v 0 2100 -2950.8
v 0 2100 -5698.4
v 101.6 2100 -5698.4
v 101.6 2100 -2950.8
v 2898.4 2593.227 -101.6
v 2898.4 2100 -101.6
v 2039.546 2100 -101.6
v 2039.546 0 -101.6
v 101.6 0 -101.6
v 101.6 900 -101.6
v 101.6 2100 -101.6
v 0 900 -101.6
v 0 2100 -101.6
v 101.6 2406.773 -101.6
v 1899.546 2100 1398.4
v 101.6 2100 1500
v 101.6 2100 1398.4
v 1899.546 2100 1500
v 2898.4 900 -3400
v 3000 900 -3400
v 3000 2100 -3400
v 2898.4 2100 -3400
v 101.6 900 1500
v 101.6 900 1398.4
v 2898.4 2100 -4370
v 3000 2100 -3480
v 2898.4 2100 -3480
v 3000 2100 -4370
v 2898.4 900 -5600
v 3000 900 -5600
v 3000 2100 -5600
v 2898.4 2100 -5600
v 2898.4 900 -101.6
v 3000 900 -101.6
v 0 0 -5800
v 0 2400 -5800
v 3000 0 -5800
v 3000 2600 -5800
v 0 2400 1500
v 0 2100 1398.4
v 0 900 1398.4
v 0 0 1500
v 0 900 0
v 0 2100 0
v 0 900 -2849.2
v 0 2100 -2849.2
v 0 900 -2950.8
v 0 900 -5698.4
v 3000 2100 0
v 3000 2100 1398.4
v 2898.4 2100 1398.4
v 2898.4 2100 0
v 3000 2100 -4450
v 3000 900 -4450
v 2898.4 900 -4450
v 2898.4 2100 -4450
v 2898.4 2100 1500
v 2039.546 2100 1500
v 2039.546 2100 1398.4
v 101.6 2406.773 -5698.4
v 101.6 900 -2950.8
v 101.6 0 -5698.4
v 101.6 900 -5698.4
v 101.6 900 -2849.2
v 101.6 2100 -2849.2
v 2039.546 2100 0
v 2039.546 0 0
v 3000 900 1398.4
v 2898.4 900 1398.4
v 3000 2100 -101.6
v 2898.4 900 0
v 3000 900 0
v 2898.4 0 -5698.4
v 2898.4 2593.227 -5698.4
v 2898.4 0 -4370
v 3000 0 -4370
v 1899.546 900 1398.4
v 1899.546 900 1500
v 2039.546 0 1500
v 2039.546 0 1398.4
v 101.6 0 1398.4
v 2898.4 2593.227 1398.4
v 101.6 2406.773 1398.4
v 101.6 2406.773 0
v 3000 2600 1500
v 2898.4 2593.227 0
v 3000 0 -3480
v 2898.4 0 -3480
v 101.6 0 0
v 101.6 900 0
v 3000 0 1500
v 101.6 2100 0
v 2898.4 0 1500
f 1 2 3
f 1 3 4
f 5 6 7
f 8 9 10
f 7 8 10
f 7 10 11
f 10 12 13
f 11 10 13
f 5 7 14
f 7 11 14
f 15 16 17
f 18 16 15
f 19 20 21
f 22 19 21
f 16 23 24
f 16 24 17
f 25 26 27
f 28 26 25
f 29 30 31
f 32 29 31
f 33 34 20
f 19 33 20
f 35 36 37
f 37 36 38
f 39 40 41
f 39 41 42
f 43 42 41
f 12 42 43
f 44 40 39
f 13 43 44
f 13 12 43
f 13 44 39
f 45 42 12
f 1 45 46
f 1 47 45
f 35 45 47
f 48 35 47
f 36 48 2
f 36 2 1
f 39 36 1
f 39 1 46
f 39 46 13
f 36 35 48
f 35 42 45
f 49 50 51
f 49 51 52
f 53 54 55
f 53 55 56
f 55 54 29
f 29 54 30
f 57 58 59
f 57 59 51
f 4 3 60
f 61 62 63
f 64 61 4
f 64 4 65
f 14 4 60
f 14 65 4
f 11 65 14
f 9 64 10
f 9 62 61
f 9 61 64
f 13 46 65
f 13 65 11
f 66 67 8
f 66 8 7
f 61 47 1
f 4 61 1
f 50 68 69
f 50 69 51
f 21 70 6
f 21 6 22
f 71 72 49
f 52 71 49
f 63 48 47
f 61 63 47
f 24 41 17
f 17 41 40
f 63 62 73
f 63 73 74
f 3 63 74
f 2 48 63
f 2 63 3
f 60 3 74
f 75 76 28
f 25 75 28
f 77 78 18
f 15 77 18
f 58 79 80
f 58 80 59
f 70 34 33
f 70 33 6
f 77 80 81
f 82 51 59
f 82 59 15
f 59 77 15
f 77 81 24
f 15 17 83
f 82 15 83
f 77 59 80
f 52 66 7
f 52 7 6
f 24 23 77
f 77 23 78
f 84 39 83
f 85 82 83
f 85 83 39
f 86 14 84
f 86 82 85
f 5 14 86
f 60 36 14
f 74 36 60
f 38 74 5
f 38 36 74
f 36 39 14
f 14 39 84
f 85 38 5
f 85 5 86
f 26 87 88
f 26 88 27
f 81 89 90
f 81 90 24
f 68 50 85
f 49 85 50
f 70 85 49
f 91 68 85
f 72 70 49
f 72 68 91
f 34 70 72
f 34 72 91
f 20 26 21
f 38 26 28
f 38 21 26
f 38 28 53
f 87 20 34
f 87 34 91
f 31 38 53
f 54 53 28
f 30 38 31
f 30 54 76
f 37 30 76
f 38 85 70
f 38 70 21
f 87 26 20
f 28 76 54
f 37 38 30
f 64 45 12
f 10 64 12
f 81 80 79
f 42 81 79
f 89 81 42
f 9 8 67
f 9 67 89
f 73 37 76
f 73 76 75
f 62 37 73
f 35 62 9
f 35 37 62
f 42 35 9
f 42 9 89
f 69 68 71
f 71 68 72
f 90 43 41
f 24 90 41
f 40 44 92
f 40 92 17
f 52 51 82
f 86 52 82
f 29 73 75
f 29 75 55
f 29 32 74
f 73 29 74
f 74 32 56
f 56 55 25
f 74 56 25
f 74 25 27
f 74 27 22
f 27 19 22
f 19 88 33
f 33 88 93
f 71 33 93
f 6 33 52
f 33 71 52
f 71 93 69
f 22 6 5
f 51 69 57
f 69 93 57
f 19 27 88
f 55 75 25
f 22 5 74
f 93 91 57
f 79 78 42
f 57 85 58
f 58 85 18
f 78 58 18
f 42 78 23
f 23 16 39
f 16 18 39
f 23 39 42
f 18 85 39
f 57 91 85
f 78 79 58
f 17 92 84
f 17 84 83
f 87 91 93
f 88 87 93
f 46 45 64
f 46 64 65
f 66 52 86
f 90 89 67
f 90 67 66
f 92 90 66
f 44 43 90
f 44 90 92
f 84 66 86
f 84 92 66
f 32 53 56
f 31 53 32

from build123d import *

# Parameters (mm, degrees)
CROQUIS1_W              = 3000
CROQUIS1_H              = 2600
SALIENTE_EXTRUIR1_DEPTH = 5800
CORTAR_EXTRUIR1_DEPTH   = 5800
CROQUIS4_W              = 2747.6
CROQUIS4_H              = 1200
CORTAR_EXTRUIR2_DEPTH   = 101.6
CROQUIS6_W              = 2796.8
CROQUIS6_H              = 5596.8
CORTAR_EXTRUIR5_DEPTH   = 3000
SALIENTE_EXTRUIR3_DEPTH = 1500
CROQUIS14_W             = 2796.8
CROQUIS14_H             = 1398.4
CORTAR_EXTRUIR7_DEPTH   = 3000
CORTAR_EXTRUIR8_REACH   = 8311.633
CROQUIS15_W             = 858.853595779
CROQUIS15_H             = 2100
CROQUIS16_W             = 1398.4
CROQUIS16_H             = 1200
CORTAR_EXTRUIR9_DEPTH   = 200
CROQUIS17_W             = 1797.946404221
CROQUIS17_H             = 1200
CORTAR_EXTRUIR10_DEPTH  = 200
CROQUIS18_W             = 1398.4
CROQUIS18_H             = 1200
CROQUIS18_W_2           = 3298.4
CORTAR_EXTRUIR11_DEPTH  = 200
CROQUIS19_W             = 1150
CROQUIS19_H             = 1200
CORTAR_EXTRUIR12_DEPTH  = 200
CROQUIS20_W             = 890
CROQUIS20_H             = 2100
CORTAR_EXTRUIR13_DEPTH  = 200


with BuildPart() as part:
    # Croquis1 → Saliente-Extruir1 (new body)
    with BuildSketch(Plane.XY):
        with Locations((1500, 1300)):
            Rectangle(CROQUIS1_W, CROQUIS1_H)
    extrude(amount=-SALIENTE_EXTRUIR1_DEPTH)

    # Croquis3 → Cortar-Extruir1 (cut)
    with BuildSketch(Plane.XY):
        Polygon((0, 2600), (0, 2400), (3000, 2600), align=None)
    extrude(amount=-CORTAR_EXTRUIR1_DEPTH, mode=Mode.SUBTRACT)

    # Croquis4 → Cortar-Extruir2 (cut)
    with BuildSketch(Plane.ZY):
        with Locations((-4324.6, 1500)):
            Rectangle(CROQUIS4_W, CROQUIS4_H)
        with Locations((-1475.4, 1500)):
            Rectangle(CROQUIS4_W, CROQUIS4_H)
    extrude(amount=-CORTAR_EXTRUIR2_DEPTH, mode=Mode.SUBTRACT)

    # Croquis6 → Cortar-Extruir5 (cut)
    with BuildSketch(Plane.XZ):
        with Locations((1500, -2900)):
            Rectangle(CROQUIS6_W, CROQUIS6_H)
    extrude(amount=-CORTAR_EXTRUIR5_DEPTH, mode=Mode.SUBTRACT)

    # Croquis13 → Saliente-Extruir3 (add)
    with BuildSketch(Plane.XY):
        Polygon((0, 0), (0, 2400), (3000, 2600), (3000, 0), align=None)
    extrude(amount=SALIENTE_EXTRUIR3_DEPTH)

    # Croquis14 → Cortar-Extruir7 (cut)
    with BuildSketch(Plane.XZ):
        with Locations((1500, 699.2)):
            Rectangle(CROQUIS14_W, CROQUIS14_H)
    extrude(amount=-CORTAR_EXTRUIR7_DEPTH, mode=Mode.SUBTRACT)

    # Cortar-Extruir8: up to this face of the body (flat: up to its plane)
    cortar_extruir8_end = Plane(part.part.faces().sort_by_distance((1492.247795295, 1254.854041559, -101.6))[0])
    # Croquis15 → Cortar-Extruir8 (cut, up to the picked face)
    with BuildSketch(Plane.XY.offset(1500), mode=Mode.PRIVATE) as cortar_extruir8_sk1:
        with Locations((2468.973202111, 1050)):
            Rectangle(CROQUIS15_W, CROQUIS15_H)
    cortar_extruir8_tool1 = split(extrude(cortar_extruir8_sk1.sketch, amount=-CORTAR_EXTRUIR8_REACH, mode=Mode.PRIVATE), bisect_by=cortar_extruir8_end, keep=Keep.BOTH, mode=Mode.PRIVATE)
    add(cortar_extruir8_tool1.solids().sort_by(Axis((2468.973202, 1050, 1500), (0, 0, -1)))[0], mode=Mode.SUBTRACT)

    # Croquis16 → Cortar-Extruir9 (cut)
    with BuildSketch(Plane.ZY):
        with Locations((699.2, 1500)):
            Rectangle(CROQUIS16_W, CROQUIS16_H)
    extrude(amount=-CORTAR_EXTRUIR9_DEPTH, mode=Mode.SUBTRACT)

    # Croquis17 → Cortar-Extruir10 (cut)
    with BuildSketch(Plane.XY.offset(1500)):
        with Locations((1000.573202111, 1500)):
            Rectangle(CROQUIS17_W, CROQUIS17_H)
    extrude(amount=-CORTAR_EXTRUIR10_DEPTH, mode=Mode.SUBTRACT)

    # Croquis18 → Cortar-Extruir11 (cut)
    with BuildSketch(Plane(origin=(3000, 0, 0), x_dir=(0, 0, -1), z_dir=(1, 0, 0))):
        with Locations((-699.2, 1500)):
            Rectangle(CROQUIS18_W, CROQUIS18_H)
        with Locations((1750.8, 1500)):
            Rectangle(CROQUIS18_W_2, CROQUIS18_H)
    extrude(amount=-CORTAR_EXTRUIR11_DEPTH, mode=Mode.SUBTRACT)

    # Croquis19 → Cortar-Extruir12 (cut)
    with BuildSketch(Plane(origin=(3000, 0, 0), x_dir=(0, 0, -1), z_dir=(1, 0, 0))):
        with Locations((5025, 1500)):
            Rectangle(CROQUIS19_W, CROQUIS19_H)
    extrude(amount=-CORTAR_EXTRUIR12_DEPTH, mode=Mode.SUBTRACT)

    # Croquis20 → Cortar-Extruir13 (cut)
    with BuildSketch(Plane(origin=(3000, 0, 0), x_dir=(0, 0, -1), z_dir=(1, 0, 0))):
        with Locations((3925, 1050)):
            Rectangle(CROQUIS20_W, CROQUIS20_H)
    extrude(amount=-CORTAR_EXTRUIR13_DEPTH, mode=Mode.SUBTRACT)


solid = part.part
